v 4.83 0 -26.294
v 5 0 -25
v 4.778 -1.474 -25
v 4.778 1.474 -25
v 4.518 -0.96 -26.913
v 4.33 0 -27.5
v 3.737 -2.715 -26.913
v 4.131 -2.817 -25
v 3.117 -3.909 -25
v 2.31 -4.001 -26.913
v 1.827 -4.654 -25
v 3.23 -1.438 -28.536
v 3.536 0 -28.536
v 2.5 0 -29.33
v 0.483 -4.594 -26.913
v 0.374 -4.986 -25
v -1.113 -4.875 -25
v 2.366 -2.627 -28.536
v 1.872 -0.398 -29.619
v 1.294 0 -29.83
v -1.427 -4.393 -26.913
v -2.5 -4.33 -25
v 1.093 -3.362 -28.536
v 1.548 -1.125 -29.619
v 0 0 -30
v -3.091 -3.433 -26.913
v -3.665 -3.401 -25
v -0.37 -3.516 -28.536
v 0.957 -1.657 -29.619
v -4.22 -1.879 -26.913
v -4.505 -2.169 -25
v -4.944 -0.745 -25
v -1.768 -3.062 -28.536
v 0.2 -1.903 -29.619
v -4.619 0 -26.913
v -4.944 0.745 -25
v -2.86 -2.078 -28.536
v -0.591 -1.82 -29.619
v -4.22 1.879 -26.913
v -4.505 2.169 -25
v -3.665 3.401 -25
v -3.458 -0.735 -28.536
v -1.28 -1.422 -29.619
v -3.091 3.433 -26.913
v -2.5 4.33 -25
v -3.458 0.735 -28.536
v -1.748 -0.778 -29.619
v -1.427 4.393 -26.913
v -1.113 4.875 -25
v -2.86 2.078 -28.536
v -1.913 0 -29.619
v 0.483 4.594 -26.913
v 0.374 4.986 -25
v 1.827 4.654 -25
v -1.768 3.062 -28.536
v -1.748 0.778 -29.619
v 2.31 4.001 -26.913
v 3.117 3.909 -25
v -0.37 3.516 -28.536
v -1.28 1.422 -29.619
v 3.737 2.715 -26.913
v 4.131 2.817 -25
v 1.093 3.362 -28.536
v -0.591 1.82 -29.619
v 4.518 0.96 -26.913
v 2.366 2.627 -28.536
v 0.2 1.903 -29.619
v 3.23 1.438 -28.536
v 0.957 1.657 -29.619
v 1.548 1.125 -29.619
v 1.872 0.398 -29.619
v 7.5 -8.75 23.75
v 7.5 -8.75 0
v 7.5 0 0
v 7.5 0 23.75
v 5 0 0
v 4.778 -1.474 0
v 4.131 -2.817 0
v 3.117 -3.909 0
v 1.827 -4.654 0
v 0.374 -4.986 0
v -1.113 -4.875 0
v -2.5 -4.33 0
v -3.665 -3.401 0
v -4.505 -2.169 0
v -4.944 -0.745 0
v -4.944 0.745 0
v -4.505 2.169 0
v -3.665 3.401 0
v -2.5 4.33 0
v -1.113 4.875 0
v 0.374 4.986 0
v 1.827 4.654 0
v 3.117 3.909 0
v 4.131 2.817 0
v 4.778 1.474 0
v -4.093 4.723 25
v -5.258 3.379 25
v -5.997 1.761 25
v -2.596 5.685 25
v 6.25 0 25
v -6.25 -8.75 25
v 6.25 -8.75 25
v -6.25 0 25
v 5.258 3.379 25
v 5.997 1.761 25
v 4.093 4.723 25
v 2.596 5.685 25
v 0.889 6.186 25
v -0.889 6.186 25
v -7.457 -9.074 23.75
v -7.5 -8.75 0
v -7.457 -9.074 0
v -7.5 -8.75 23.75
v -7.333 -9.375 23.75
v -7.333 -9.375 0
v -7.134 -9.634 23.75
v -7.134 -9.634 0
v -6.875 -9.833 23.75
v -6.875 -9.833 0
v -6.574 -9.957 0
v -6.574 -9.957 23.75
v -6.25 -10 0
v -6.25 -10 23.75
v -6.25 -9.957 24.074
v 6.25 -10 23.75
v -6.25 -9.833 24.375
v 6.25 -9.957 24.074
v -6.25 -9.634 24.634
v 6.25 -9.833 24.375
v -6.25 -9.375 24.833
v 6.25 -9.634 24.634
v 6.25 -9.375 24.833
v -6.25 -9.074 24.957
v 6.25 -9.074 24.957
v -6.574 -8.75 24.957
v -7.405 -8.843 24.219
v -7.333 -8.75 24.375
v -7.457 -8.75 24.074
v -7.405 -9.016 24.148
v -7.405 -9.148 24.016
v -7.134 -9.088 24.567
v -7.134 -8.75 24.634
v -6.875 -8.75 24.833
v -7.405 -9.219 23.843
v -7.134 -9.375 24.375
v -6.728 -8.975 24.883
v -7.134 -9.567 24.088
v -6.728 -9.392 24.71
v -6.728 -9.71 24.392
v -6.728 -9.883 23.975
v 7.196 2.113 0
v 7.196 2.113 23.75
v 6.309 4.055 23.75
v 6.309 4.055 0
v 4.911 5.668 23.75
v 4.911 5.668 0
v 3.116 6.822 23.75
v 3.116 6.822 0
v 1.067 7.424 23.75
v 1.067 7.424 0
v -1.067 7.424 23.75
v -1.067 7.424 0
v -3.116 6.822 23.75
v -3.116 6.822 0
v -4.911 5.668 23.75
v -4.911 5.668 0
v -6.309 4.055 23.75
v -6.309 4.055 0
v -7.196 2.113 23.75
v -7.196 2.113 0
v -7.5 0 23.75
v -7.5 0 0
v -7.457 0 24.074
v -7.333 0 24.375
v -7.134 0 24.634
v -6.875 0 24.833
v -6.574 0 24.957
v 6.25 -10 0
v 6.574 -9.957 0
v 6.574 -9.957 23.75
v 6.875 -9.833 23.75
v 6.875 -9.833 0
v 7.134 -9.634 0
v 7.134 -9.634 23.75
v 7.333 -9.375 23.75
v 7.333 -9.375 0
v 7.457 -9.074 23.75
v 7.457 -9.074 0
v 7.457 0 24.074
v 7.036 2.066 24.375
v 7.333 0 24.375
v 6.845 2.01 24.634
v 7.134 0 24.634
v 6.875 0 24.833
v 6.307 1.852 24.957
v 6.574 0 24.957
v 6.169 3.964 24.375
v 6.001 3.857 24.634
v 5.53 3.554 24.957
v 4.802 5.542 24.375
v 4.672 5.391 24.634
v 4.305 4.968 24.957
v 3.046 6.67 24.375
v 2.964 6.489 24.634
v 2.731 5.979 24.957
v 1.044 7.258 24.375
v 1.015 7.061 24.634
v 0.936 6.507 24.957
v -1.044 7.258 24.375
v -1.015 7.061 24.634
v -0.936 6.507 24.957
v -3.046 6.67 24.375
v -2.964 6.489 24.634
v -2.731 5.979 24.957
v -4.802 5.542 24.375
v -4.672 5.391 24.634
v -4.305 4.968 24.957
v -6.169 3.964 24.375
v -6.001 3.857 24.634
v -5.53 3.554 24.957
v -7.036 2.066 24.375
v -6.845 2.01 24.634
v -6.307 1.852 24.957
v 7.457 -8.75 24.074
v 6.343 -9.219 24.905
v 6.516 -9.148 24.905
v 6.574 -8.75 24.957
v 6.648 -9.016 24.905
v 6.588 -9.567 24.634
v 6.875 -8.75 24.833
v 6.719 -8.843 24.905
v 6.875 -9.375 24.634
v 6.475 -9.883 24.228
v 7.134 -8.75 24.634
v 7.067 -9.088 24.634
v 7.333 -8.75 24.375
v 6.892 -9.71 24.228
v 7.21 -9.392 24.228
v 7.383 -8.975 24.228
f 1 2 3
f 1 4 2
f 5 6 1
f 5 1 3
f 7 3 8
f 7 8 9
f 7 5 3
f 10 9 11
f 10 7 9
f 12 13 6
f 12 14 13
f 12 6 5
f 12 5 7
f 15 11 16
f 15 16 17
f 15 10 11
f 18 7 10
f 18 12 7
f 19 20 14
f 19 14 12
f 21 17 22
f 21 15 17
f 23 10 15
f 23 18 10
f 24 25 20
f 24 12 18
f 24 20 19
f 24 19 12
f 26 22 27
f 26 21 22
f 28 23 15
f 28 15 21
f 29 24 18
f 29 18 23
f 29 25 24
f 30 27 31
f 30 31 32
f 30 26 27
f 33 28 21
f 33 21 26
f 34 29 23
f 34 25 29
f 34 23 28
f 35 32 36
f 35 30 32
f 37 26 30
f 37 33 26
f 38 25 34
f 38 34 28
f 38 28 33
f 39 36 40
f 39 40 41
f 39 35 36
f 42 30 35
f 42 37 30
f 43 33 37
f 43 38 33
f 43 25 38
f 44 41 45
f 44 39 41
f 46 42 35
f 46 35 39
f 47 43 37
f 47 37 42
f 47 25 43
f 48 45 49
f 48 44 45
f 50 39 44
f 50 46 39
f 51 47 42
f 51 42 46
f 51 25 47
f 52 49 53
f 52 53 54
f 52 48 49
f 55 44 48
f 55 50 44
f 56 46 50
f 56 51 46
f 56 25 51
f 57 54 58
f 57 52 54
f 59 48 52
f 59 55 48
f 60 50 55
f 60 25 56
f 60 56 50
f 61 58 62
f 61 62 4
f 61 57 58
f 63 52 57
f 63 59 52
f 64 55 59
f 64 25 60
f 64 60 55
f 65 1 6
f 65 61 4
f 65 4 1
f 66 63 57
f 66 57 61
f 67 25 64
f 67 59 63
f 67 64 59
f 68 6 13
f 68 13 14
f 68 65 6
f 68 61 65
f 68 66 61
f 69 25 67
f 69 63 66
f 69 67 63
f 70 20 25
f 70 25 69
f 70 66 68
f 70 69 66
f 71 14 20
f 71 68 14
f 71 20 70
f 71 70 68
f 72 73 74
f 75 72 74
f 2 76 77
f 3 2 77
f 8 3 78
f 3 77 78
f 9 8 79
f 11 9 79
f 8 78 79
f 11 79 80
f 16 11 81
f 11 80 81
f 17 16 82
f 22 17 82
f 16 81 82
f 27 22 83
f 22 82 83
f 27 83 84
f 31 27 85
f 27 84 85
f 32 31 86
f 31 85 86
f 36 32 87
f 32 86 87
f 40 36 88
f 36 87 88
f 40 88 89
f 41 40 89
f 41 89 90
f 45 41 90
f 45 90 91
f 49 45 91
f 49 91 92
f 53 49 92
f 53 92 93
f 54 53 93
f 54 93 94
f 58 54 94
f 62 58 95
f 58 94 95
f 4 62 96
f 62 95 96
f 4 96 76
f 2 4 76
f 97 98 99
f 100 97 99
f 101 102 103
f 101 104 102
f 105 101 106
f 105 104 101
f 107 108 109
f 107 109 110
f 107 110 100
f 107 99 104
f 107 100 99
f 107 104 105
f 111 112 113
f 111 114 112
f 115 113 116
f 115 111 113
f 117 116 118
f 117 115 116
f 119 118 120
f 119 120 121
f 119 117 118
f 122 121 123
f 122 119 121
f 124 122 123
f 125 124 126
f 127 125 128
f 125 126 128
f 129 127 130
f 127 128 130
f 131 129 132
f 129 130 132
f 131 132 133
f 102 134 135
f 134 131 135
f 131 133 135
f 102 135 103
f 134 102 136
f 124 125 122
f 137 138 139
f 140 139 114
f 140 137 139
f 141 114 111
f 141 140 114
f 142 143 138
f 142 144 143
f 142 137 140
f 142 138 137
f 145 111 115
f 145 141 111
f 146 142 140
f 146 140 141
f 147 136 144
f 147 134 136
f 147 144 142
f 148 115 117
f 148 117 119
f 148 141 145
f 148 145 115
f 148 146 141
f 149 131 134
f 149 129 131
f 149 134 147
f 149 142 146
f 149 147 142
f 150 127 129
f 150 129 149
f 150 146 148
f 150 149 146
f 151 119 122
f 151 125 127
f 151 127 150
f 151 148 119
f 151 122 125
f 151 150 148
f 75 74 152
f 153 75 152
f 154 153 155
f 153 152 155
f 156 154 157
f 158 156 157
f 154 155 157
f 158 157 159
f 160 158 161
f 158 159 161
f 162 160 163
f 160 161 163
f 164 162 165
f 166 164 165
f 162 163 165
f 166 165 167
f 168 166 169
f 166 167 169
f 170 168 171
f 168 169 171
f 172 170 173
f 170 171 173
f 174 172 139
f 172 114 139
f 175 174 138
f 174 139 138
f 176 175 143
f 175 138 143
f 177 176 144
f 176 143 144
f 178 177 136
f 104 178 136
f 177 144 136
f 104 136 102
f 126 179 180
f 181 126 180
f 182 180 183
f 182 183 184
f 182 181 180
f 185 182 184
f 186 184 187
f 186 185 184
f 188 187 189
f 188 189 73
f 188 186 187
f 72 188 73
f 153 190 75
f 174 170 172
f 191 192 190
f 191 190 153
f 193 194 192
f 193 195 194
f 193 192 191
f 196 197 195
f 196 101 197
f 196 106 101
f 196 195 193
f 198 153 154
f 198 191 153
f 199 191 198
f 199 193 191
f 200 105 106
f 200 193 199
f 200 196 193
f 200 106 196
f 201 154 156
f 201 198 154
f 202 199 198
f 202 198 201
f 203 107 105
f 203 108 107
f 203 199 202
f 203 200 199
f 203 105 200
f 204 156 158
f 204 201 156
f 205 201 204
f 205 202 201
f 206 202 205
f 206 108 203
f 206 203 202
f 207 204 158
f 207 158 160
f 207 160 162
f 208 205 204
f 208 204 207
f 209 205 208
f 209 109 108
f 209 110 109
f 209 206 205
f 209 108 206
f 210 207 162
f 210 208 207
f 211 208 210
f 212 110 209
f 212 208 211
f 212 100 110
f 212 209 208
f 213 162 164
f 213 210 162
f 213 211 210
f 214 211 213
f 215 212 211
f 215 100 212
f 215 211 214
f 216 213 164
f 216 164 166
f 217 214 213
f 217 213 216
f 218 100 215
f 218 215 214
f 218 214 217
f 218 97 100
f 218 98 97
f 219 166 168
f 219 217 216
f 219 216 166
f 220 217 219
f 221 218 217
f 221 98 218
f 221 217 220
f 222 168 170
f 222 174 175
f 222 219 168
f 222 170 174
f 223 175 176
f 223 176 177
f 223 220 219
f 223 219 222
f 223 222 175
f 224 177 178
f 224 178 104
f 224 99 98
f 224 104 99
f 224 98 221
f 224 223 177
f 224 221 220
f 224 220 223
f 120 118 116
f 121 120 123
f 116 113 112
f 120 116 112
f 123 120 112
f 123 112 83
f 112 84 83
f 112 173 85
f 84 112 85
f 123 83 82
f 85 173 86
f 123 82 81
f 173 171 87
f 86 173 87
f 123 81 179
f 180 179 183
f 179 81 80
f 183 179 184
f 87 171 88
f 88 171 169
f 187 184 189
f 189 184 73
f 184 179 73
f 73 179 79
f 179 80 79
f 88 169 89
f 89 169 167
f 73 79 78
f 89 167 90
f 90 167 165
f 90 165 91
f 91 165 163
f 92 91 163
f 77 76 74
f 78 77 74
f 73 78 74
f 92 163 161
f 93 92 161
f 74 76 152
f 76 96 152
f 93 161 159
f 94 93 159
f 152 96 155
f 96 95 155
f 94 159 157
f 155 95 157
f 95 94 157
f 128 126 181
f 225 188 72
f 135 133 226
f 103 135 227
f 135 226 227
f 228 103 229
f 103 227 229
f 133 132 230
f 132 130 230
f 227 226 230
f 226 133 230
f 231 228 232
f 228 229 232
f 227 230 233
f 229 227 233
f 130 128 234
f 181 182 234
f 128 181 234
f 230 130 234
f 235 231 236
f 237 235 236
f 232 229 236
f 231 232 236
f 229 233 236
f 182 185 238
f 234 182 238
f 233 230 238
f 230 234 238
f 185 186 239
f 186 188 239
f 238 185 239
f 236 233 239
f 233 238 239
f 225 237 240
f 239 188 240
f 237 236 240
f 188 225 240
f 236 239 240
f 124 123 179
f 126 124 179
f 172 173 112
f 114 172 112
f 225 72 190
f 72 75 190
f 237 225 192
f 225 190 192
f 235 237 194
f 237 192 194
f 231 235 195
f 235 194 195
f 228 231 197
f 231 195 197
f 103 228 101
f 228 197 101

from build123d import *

# Parameters (mm, degrees)
F1_DEPTH = 25
F2_R     = 1.25
F3_R     = 5
F4_DEPTH = 30
F5_R     = 5


with BuildPart() as f1:
    # F0 (on Top) → F1 (new body)
    with BuildSketch(Plane.XY):
        with BuildLine():
            Line((-7.5, 0), (-7.5, -10))
            Line((-7.5, -10), (7.5, -10))
            Line((7.5, -10), (7.5, 0))
            ThreePointArc((7.5, 0), (0, 7.5), (-7.5, 0))
        make_face()
    extrude(amount=F1_DEPTH)

    # F2
    f2_edges = [f1.edges().sort_by_distance(p)[0] for p in [
        (7.5, -10, 12.5),
        (0, -10, 25),
        (7.5, -5, 25),
        (-7.5, -10, 12.5),
    ]]
    fillet(f2_edges, radius=F2_R)

    # F3 (on face) → F4 (join)
    with BuildSketch(Plane(origin=(0, 0, 0), x_dir=(1, 0, 0), z_dir=(0, 0, -1))):
        Circle(F3_R)
    extrude(amount=F4_DEPTH)

    # F5
    f5_edges = [f1.edges().sort_by_distance(p)[0] for p in [
        (-5, 0, -30),
    ]]
    fillet(f5_edges, radius=F5_R)


solid = f1.part
